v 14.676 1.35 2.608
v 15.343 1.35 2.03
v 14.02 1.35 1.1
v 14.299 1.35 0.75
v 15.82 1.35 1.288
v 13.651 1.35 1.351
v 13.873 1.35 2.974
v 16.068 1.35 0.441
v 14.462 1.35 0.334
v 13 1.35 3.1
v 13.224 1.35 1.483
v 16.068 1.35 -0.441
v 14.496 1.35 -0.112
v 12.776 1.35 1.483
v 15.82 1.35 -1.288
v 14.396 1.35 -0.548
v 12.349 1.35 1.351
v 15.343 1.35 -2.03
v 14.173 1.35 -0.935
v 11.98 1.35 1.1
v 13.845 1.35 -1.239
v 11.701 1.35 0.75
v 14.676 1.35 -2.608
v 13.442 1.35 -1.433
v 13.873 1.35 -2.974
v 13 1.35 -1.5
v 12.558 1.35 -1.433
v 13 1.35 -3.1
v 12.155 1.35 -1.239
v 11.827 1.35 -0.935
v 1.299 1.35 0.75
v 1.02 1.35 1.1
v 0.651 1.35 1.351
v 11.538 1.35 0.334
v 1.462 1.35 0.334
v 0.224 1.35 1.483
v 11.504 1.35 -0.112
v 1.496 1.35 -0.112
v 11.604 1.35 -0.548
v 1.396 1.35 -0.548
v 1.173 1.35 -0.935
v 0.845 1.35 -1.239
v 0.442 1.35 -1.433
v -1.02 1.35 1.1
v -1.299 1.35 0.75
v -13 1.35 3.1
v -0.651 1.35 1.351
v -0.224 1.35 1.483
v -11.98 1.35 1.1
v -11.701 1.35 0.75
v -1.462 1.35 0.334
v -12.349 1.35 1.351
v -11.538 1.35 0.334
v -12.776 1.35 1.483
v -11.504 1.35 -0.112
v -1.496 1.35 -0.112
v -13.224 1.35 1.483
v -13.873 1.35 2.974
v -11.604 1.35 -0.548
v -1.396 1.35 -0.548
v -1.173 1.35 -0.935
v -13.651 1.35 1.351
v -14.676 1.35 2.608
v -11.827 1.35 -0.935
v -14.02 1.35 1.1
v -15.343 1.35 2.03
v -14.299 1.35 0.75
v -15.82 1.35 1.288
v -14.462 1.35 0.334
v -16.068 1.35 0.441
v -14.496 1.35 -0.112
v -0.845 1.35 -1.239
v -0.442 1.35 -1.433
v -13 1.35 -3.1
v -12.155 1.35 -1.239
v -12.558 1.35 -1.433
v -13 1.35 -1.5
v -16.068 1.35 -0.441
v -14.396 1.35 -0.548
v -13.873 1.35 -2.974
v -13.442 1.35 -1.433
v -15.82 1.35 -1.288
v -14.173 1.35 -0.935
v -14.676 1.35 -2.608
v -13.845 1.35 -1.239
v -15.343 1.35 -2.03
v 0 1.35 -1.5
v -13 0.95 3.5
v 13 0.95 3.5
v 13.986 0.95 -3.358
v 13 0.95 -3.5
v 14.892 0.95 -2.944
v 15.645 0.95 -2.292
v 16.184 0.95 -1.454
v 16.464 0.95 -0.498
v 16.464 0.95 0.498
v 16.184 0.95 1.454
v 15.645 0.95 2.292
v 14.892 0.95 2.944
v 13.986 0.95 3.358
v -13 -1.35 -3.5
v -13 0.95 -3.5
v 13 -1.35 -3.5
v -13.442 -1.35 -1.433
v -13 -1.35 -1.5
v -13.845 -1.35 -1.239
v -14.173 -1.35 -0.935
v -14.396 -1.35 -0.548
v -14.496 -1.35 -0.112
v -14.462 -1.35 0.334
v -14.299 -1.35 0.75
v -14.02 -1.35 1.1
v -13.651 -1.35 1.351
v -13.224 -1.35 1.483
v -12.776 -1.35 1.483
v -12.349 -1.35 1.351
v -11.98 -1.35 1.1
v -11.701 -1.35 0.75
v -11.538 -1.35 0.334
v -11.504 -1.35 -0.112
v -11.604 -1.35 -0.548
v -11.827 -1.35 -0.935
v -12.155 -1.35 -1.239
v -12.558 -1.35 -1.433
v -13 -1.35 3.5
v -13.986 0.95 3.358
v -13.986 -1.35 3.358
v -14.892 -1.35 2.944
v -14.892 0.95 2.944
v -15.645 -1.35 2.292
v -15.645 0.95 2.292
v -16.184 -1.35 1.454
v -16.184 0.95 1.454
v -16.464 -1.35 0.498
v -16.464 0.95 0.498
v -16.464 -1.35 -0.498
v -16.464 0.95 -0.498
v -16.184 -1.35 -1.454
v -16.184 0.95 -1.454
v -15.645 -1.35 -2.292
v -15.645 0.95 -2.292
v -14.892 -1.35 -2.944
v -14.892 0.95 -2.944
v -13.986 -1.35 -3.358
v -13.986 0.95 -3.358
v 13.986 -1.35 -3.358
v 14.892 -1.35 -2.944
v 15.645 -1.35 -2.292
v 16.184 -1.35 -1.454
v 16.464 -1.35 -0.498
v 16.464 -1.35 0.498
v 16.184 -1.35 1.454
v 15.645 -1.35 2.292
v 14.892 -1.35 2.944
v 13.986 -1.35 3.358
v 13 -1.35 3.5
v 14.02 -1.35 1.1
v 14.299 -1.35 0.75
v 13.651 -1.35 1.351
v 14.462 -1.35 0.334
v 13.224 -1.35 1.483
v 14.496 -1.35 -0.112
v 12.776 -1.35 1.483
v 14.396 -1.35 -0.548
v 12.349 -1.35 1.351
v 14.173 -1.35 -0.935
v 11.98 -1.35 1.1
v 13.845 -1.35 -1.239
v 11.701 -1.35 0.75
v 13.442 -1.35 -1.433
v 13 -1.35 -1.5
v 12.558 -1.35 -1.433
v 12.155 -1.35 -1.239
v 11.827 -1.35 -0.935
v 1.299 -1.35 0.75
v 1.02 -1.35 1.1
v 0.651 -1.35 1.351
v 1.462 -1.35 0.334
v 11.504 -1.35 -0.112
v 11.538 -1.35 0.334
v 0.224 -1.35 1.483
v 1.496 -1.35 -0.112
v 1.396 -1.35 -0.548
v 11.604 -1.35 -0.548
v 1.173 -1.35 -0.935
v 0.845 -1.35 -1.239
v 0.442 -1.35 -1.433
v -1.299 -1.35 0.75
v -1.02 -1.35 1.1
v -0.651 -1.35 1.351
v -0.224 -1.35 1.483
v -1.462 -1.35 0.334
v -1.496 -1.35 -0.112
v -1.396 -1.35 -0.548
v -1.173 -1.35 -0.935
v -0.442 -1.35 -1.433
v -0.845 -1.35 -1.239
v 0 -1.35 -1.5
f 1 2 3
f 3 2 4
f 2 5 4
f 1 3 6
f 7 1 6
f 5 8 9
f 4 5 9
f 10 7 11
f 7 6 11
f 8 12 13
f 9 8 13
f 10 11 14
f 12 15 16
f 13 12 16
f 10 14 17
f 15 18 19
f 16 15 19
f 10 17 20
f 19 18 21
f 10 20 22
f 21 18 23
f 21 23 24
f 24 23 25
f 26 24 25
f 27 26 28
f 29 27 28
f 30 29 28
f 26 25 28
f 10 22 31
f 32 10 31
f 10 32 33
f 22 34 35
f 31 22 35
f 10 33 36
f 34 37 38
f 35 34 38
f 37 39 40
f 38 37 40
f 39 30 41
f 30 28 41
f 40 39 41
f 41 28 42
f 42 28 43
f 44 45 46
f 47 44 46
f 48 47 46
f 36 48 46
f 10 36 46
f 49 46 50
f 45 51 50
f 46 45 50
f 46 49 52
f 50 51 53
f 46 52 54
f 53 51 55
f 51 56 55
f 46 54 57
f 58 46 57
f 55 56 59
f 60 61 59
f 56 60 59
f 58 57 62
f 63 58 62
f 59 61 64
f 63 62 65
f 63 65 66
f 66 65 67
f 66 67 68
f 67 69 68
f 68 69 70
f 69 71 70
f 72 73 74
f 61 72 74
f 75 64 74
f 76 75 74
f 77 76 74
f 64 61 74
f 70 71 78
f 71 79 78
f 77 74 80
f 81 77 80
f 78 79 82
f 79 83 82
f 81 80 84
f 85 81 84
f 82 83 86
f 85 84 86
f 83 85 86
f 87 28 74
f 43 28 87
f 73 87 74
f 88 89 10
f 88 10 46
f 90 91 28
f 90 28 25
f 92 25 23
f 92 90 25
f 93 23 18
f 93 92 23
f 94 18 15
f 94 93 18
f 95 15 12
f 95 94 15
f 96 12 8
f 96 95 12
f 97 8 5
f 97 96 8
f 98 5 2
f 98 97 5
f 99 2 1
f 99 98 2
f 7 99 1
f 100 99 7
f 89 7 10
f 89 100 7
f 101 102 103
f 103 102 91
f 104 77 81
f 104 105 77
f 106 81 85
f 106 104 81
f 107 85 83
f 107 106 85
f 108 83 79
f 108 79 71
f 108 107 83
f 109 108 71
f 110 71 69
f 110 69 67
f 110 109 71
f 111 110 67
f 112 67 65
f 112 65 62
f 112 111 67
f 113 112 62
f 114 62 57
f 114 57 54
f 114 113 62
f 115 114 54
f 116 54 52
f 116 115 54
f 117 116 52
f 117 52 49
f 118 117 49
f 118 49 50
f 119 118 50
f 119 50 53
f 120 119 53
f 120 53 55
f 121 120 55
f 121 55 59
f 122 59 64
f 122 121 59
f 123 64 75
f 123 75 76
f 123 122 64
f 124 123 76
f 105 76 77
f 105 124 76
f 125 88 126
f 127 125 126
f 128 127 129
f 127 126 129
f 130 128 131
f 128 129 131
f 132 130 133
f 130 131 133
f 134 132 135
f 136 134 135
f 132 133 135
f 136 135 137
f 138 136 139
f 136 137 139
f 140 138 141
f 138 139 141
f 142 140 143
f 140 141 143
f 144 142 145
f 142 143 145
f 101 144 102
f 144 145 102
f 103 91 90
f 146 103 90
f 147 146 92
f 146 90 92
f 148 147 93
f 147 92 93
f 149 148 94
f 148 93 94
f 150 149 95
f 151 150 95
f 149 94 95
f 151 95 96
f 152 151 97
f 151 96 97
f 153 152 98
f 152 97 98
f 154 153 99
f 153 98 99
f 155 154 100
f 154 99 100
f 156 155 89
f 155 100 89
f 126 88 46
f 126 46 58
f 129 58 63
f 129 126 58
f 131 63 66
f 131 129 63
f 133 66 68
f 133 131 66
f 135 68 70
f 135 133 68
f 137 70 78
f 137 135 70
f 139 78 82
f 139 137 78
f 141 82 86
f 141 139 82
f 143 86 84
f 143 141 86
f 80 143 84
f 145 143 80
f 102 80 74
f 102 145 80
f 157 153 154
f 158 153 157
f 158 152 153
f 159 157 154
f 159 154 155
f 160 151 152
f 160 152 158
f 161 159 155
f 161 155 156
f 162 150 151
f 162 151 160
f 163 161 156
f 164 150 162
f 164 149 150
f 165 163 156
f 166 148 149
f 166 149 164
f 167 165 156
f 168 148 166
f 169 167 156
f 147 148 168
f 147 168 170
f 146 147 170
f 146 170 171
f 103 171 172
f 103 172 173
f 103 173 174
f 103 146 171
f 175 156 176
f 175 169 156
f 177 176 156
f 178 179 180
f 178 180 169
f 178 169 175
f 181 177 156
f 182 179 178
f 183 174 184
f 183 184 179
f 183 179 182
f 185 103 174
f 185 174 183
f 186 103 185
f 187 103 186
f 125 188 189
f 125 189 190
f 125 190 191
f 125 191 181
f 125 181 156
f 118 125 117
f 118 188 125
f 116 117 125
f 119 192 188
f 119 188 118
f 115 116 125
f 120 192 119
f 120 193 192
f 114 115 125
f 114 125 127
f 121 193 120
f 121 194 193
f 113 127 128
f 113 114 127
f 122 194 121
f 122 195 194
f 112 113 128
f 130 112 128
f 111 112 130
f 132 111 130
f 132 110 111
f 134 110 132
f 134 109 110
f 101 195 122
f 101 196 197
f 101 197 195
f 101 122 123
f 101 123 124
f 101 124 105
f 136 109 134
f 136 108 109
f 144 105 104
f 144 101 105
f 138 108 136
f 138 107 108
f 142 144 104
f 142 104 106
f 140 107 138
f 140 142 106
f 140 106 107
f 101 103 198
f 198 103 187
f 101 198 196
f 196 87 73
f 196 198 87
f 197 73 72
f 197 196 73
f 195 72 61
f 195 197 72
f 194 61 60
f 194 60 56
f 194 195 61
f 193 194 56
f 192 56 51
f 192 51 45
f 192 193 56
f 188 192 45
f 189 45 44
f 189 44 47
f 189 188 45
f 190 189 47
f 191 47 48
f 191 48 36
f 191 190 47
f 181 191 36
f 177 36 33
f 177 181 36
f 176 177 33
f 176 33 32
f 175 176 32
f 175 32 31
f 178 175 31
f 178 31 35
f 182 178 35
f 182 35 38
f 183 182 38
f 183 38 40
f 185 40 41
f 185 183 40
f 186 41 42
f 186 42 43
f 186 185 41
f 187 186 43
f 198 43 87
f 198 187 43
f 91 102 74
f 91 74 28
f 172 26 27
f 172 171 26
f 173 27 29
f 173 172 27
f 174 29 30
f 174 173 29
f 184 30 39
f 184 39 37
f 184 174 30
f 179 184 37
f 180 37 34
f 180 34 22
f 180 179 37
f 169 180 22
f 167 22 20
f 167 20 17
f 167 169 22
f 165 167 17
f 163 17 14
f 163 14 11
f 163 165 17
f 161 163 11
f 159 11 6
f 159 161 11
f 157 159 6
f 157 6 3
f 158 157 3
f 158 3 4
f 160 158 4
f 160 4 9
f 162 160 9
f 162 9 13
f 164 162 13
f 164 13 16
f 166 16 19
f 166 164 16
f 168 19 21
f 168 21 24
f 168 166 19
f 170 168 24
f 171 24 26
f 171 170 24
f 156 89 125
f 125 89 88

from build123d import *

# Parameters (mm, degrees)
SKETCH1_R           = 1.5
BOSS_EXTRUDE1_DEPTH = 1.35
CHAMFER1_SIZE       = 0.4


with BuildPart() as part:
    # Sketch1 → Boss-Extrude1 (new, symmetric)
    with BuildSketch(Plane(origin=(0, 0, 0), x_dir=(1, 0, 0), z_dir=(0, 1, 0))):
        with BuildLine():
            Line((-13, 3.5), (13, 3.5))
            ThreePointArc((13, 3.5), (16.5, 0), (13, -3.5))
            Line((13, -3.5), (-13, -3.5))
            ThreePointArc((-13, -3.5), (-16.5, 0), (-13, 3.5))
        make_face()
        with Locations(Location((-13, 0, 0), (0, 0, 90))):
            Circle(SKETCH1_R, mode=Mode.SUBTRACT)
        with Locations(Location((13, 0, 0), (0, 0, 90))):
            Circle(SKETCH1_R, mode=Mode.SUBTRACT)
        with Locations(Location((0, 0, 0), (0, 0, 90))):
            Circle(SKETCH1_R, mode=Mode.SUBTRACT)
    extrude(amount=BOSS_EXTRUDE1_DEPTH, both=True)

    # Chamfer1
    chamfer1_edges = [part.edges().sort_by_distance(p)[0] for p in [
        (16.5, 1.35, 0),
        (0, 1.35, -3.5),
        (-16.5, 1.35, 0),
        (0, 1.35, 3.5),
    ]]
    chamfer(chamfer1_edges, length=CHAMFER1_SIZE)


solid = part.part
